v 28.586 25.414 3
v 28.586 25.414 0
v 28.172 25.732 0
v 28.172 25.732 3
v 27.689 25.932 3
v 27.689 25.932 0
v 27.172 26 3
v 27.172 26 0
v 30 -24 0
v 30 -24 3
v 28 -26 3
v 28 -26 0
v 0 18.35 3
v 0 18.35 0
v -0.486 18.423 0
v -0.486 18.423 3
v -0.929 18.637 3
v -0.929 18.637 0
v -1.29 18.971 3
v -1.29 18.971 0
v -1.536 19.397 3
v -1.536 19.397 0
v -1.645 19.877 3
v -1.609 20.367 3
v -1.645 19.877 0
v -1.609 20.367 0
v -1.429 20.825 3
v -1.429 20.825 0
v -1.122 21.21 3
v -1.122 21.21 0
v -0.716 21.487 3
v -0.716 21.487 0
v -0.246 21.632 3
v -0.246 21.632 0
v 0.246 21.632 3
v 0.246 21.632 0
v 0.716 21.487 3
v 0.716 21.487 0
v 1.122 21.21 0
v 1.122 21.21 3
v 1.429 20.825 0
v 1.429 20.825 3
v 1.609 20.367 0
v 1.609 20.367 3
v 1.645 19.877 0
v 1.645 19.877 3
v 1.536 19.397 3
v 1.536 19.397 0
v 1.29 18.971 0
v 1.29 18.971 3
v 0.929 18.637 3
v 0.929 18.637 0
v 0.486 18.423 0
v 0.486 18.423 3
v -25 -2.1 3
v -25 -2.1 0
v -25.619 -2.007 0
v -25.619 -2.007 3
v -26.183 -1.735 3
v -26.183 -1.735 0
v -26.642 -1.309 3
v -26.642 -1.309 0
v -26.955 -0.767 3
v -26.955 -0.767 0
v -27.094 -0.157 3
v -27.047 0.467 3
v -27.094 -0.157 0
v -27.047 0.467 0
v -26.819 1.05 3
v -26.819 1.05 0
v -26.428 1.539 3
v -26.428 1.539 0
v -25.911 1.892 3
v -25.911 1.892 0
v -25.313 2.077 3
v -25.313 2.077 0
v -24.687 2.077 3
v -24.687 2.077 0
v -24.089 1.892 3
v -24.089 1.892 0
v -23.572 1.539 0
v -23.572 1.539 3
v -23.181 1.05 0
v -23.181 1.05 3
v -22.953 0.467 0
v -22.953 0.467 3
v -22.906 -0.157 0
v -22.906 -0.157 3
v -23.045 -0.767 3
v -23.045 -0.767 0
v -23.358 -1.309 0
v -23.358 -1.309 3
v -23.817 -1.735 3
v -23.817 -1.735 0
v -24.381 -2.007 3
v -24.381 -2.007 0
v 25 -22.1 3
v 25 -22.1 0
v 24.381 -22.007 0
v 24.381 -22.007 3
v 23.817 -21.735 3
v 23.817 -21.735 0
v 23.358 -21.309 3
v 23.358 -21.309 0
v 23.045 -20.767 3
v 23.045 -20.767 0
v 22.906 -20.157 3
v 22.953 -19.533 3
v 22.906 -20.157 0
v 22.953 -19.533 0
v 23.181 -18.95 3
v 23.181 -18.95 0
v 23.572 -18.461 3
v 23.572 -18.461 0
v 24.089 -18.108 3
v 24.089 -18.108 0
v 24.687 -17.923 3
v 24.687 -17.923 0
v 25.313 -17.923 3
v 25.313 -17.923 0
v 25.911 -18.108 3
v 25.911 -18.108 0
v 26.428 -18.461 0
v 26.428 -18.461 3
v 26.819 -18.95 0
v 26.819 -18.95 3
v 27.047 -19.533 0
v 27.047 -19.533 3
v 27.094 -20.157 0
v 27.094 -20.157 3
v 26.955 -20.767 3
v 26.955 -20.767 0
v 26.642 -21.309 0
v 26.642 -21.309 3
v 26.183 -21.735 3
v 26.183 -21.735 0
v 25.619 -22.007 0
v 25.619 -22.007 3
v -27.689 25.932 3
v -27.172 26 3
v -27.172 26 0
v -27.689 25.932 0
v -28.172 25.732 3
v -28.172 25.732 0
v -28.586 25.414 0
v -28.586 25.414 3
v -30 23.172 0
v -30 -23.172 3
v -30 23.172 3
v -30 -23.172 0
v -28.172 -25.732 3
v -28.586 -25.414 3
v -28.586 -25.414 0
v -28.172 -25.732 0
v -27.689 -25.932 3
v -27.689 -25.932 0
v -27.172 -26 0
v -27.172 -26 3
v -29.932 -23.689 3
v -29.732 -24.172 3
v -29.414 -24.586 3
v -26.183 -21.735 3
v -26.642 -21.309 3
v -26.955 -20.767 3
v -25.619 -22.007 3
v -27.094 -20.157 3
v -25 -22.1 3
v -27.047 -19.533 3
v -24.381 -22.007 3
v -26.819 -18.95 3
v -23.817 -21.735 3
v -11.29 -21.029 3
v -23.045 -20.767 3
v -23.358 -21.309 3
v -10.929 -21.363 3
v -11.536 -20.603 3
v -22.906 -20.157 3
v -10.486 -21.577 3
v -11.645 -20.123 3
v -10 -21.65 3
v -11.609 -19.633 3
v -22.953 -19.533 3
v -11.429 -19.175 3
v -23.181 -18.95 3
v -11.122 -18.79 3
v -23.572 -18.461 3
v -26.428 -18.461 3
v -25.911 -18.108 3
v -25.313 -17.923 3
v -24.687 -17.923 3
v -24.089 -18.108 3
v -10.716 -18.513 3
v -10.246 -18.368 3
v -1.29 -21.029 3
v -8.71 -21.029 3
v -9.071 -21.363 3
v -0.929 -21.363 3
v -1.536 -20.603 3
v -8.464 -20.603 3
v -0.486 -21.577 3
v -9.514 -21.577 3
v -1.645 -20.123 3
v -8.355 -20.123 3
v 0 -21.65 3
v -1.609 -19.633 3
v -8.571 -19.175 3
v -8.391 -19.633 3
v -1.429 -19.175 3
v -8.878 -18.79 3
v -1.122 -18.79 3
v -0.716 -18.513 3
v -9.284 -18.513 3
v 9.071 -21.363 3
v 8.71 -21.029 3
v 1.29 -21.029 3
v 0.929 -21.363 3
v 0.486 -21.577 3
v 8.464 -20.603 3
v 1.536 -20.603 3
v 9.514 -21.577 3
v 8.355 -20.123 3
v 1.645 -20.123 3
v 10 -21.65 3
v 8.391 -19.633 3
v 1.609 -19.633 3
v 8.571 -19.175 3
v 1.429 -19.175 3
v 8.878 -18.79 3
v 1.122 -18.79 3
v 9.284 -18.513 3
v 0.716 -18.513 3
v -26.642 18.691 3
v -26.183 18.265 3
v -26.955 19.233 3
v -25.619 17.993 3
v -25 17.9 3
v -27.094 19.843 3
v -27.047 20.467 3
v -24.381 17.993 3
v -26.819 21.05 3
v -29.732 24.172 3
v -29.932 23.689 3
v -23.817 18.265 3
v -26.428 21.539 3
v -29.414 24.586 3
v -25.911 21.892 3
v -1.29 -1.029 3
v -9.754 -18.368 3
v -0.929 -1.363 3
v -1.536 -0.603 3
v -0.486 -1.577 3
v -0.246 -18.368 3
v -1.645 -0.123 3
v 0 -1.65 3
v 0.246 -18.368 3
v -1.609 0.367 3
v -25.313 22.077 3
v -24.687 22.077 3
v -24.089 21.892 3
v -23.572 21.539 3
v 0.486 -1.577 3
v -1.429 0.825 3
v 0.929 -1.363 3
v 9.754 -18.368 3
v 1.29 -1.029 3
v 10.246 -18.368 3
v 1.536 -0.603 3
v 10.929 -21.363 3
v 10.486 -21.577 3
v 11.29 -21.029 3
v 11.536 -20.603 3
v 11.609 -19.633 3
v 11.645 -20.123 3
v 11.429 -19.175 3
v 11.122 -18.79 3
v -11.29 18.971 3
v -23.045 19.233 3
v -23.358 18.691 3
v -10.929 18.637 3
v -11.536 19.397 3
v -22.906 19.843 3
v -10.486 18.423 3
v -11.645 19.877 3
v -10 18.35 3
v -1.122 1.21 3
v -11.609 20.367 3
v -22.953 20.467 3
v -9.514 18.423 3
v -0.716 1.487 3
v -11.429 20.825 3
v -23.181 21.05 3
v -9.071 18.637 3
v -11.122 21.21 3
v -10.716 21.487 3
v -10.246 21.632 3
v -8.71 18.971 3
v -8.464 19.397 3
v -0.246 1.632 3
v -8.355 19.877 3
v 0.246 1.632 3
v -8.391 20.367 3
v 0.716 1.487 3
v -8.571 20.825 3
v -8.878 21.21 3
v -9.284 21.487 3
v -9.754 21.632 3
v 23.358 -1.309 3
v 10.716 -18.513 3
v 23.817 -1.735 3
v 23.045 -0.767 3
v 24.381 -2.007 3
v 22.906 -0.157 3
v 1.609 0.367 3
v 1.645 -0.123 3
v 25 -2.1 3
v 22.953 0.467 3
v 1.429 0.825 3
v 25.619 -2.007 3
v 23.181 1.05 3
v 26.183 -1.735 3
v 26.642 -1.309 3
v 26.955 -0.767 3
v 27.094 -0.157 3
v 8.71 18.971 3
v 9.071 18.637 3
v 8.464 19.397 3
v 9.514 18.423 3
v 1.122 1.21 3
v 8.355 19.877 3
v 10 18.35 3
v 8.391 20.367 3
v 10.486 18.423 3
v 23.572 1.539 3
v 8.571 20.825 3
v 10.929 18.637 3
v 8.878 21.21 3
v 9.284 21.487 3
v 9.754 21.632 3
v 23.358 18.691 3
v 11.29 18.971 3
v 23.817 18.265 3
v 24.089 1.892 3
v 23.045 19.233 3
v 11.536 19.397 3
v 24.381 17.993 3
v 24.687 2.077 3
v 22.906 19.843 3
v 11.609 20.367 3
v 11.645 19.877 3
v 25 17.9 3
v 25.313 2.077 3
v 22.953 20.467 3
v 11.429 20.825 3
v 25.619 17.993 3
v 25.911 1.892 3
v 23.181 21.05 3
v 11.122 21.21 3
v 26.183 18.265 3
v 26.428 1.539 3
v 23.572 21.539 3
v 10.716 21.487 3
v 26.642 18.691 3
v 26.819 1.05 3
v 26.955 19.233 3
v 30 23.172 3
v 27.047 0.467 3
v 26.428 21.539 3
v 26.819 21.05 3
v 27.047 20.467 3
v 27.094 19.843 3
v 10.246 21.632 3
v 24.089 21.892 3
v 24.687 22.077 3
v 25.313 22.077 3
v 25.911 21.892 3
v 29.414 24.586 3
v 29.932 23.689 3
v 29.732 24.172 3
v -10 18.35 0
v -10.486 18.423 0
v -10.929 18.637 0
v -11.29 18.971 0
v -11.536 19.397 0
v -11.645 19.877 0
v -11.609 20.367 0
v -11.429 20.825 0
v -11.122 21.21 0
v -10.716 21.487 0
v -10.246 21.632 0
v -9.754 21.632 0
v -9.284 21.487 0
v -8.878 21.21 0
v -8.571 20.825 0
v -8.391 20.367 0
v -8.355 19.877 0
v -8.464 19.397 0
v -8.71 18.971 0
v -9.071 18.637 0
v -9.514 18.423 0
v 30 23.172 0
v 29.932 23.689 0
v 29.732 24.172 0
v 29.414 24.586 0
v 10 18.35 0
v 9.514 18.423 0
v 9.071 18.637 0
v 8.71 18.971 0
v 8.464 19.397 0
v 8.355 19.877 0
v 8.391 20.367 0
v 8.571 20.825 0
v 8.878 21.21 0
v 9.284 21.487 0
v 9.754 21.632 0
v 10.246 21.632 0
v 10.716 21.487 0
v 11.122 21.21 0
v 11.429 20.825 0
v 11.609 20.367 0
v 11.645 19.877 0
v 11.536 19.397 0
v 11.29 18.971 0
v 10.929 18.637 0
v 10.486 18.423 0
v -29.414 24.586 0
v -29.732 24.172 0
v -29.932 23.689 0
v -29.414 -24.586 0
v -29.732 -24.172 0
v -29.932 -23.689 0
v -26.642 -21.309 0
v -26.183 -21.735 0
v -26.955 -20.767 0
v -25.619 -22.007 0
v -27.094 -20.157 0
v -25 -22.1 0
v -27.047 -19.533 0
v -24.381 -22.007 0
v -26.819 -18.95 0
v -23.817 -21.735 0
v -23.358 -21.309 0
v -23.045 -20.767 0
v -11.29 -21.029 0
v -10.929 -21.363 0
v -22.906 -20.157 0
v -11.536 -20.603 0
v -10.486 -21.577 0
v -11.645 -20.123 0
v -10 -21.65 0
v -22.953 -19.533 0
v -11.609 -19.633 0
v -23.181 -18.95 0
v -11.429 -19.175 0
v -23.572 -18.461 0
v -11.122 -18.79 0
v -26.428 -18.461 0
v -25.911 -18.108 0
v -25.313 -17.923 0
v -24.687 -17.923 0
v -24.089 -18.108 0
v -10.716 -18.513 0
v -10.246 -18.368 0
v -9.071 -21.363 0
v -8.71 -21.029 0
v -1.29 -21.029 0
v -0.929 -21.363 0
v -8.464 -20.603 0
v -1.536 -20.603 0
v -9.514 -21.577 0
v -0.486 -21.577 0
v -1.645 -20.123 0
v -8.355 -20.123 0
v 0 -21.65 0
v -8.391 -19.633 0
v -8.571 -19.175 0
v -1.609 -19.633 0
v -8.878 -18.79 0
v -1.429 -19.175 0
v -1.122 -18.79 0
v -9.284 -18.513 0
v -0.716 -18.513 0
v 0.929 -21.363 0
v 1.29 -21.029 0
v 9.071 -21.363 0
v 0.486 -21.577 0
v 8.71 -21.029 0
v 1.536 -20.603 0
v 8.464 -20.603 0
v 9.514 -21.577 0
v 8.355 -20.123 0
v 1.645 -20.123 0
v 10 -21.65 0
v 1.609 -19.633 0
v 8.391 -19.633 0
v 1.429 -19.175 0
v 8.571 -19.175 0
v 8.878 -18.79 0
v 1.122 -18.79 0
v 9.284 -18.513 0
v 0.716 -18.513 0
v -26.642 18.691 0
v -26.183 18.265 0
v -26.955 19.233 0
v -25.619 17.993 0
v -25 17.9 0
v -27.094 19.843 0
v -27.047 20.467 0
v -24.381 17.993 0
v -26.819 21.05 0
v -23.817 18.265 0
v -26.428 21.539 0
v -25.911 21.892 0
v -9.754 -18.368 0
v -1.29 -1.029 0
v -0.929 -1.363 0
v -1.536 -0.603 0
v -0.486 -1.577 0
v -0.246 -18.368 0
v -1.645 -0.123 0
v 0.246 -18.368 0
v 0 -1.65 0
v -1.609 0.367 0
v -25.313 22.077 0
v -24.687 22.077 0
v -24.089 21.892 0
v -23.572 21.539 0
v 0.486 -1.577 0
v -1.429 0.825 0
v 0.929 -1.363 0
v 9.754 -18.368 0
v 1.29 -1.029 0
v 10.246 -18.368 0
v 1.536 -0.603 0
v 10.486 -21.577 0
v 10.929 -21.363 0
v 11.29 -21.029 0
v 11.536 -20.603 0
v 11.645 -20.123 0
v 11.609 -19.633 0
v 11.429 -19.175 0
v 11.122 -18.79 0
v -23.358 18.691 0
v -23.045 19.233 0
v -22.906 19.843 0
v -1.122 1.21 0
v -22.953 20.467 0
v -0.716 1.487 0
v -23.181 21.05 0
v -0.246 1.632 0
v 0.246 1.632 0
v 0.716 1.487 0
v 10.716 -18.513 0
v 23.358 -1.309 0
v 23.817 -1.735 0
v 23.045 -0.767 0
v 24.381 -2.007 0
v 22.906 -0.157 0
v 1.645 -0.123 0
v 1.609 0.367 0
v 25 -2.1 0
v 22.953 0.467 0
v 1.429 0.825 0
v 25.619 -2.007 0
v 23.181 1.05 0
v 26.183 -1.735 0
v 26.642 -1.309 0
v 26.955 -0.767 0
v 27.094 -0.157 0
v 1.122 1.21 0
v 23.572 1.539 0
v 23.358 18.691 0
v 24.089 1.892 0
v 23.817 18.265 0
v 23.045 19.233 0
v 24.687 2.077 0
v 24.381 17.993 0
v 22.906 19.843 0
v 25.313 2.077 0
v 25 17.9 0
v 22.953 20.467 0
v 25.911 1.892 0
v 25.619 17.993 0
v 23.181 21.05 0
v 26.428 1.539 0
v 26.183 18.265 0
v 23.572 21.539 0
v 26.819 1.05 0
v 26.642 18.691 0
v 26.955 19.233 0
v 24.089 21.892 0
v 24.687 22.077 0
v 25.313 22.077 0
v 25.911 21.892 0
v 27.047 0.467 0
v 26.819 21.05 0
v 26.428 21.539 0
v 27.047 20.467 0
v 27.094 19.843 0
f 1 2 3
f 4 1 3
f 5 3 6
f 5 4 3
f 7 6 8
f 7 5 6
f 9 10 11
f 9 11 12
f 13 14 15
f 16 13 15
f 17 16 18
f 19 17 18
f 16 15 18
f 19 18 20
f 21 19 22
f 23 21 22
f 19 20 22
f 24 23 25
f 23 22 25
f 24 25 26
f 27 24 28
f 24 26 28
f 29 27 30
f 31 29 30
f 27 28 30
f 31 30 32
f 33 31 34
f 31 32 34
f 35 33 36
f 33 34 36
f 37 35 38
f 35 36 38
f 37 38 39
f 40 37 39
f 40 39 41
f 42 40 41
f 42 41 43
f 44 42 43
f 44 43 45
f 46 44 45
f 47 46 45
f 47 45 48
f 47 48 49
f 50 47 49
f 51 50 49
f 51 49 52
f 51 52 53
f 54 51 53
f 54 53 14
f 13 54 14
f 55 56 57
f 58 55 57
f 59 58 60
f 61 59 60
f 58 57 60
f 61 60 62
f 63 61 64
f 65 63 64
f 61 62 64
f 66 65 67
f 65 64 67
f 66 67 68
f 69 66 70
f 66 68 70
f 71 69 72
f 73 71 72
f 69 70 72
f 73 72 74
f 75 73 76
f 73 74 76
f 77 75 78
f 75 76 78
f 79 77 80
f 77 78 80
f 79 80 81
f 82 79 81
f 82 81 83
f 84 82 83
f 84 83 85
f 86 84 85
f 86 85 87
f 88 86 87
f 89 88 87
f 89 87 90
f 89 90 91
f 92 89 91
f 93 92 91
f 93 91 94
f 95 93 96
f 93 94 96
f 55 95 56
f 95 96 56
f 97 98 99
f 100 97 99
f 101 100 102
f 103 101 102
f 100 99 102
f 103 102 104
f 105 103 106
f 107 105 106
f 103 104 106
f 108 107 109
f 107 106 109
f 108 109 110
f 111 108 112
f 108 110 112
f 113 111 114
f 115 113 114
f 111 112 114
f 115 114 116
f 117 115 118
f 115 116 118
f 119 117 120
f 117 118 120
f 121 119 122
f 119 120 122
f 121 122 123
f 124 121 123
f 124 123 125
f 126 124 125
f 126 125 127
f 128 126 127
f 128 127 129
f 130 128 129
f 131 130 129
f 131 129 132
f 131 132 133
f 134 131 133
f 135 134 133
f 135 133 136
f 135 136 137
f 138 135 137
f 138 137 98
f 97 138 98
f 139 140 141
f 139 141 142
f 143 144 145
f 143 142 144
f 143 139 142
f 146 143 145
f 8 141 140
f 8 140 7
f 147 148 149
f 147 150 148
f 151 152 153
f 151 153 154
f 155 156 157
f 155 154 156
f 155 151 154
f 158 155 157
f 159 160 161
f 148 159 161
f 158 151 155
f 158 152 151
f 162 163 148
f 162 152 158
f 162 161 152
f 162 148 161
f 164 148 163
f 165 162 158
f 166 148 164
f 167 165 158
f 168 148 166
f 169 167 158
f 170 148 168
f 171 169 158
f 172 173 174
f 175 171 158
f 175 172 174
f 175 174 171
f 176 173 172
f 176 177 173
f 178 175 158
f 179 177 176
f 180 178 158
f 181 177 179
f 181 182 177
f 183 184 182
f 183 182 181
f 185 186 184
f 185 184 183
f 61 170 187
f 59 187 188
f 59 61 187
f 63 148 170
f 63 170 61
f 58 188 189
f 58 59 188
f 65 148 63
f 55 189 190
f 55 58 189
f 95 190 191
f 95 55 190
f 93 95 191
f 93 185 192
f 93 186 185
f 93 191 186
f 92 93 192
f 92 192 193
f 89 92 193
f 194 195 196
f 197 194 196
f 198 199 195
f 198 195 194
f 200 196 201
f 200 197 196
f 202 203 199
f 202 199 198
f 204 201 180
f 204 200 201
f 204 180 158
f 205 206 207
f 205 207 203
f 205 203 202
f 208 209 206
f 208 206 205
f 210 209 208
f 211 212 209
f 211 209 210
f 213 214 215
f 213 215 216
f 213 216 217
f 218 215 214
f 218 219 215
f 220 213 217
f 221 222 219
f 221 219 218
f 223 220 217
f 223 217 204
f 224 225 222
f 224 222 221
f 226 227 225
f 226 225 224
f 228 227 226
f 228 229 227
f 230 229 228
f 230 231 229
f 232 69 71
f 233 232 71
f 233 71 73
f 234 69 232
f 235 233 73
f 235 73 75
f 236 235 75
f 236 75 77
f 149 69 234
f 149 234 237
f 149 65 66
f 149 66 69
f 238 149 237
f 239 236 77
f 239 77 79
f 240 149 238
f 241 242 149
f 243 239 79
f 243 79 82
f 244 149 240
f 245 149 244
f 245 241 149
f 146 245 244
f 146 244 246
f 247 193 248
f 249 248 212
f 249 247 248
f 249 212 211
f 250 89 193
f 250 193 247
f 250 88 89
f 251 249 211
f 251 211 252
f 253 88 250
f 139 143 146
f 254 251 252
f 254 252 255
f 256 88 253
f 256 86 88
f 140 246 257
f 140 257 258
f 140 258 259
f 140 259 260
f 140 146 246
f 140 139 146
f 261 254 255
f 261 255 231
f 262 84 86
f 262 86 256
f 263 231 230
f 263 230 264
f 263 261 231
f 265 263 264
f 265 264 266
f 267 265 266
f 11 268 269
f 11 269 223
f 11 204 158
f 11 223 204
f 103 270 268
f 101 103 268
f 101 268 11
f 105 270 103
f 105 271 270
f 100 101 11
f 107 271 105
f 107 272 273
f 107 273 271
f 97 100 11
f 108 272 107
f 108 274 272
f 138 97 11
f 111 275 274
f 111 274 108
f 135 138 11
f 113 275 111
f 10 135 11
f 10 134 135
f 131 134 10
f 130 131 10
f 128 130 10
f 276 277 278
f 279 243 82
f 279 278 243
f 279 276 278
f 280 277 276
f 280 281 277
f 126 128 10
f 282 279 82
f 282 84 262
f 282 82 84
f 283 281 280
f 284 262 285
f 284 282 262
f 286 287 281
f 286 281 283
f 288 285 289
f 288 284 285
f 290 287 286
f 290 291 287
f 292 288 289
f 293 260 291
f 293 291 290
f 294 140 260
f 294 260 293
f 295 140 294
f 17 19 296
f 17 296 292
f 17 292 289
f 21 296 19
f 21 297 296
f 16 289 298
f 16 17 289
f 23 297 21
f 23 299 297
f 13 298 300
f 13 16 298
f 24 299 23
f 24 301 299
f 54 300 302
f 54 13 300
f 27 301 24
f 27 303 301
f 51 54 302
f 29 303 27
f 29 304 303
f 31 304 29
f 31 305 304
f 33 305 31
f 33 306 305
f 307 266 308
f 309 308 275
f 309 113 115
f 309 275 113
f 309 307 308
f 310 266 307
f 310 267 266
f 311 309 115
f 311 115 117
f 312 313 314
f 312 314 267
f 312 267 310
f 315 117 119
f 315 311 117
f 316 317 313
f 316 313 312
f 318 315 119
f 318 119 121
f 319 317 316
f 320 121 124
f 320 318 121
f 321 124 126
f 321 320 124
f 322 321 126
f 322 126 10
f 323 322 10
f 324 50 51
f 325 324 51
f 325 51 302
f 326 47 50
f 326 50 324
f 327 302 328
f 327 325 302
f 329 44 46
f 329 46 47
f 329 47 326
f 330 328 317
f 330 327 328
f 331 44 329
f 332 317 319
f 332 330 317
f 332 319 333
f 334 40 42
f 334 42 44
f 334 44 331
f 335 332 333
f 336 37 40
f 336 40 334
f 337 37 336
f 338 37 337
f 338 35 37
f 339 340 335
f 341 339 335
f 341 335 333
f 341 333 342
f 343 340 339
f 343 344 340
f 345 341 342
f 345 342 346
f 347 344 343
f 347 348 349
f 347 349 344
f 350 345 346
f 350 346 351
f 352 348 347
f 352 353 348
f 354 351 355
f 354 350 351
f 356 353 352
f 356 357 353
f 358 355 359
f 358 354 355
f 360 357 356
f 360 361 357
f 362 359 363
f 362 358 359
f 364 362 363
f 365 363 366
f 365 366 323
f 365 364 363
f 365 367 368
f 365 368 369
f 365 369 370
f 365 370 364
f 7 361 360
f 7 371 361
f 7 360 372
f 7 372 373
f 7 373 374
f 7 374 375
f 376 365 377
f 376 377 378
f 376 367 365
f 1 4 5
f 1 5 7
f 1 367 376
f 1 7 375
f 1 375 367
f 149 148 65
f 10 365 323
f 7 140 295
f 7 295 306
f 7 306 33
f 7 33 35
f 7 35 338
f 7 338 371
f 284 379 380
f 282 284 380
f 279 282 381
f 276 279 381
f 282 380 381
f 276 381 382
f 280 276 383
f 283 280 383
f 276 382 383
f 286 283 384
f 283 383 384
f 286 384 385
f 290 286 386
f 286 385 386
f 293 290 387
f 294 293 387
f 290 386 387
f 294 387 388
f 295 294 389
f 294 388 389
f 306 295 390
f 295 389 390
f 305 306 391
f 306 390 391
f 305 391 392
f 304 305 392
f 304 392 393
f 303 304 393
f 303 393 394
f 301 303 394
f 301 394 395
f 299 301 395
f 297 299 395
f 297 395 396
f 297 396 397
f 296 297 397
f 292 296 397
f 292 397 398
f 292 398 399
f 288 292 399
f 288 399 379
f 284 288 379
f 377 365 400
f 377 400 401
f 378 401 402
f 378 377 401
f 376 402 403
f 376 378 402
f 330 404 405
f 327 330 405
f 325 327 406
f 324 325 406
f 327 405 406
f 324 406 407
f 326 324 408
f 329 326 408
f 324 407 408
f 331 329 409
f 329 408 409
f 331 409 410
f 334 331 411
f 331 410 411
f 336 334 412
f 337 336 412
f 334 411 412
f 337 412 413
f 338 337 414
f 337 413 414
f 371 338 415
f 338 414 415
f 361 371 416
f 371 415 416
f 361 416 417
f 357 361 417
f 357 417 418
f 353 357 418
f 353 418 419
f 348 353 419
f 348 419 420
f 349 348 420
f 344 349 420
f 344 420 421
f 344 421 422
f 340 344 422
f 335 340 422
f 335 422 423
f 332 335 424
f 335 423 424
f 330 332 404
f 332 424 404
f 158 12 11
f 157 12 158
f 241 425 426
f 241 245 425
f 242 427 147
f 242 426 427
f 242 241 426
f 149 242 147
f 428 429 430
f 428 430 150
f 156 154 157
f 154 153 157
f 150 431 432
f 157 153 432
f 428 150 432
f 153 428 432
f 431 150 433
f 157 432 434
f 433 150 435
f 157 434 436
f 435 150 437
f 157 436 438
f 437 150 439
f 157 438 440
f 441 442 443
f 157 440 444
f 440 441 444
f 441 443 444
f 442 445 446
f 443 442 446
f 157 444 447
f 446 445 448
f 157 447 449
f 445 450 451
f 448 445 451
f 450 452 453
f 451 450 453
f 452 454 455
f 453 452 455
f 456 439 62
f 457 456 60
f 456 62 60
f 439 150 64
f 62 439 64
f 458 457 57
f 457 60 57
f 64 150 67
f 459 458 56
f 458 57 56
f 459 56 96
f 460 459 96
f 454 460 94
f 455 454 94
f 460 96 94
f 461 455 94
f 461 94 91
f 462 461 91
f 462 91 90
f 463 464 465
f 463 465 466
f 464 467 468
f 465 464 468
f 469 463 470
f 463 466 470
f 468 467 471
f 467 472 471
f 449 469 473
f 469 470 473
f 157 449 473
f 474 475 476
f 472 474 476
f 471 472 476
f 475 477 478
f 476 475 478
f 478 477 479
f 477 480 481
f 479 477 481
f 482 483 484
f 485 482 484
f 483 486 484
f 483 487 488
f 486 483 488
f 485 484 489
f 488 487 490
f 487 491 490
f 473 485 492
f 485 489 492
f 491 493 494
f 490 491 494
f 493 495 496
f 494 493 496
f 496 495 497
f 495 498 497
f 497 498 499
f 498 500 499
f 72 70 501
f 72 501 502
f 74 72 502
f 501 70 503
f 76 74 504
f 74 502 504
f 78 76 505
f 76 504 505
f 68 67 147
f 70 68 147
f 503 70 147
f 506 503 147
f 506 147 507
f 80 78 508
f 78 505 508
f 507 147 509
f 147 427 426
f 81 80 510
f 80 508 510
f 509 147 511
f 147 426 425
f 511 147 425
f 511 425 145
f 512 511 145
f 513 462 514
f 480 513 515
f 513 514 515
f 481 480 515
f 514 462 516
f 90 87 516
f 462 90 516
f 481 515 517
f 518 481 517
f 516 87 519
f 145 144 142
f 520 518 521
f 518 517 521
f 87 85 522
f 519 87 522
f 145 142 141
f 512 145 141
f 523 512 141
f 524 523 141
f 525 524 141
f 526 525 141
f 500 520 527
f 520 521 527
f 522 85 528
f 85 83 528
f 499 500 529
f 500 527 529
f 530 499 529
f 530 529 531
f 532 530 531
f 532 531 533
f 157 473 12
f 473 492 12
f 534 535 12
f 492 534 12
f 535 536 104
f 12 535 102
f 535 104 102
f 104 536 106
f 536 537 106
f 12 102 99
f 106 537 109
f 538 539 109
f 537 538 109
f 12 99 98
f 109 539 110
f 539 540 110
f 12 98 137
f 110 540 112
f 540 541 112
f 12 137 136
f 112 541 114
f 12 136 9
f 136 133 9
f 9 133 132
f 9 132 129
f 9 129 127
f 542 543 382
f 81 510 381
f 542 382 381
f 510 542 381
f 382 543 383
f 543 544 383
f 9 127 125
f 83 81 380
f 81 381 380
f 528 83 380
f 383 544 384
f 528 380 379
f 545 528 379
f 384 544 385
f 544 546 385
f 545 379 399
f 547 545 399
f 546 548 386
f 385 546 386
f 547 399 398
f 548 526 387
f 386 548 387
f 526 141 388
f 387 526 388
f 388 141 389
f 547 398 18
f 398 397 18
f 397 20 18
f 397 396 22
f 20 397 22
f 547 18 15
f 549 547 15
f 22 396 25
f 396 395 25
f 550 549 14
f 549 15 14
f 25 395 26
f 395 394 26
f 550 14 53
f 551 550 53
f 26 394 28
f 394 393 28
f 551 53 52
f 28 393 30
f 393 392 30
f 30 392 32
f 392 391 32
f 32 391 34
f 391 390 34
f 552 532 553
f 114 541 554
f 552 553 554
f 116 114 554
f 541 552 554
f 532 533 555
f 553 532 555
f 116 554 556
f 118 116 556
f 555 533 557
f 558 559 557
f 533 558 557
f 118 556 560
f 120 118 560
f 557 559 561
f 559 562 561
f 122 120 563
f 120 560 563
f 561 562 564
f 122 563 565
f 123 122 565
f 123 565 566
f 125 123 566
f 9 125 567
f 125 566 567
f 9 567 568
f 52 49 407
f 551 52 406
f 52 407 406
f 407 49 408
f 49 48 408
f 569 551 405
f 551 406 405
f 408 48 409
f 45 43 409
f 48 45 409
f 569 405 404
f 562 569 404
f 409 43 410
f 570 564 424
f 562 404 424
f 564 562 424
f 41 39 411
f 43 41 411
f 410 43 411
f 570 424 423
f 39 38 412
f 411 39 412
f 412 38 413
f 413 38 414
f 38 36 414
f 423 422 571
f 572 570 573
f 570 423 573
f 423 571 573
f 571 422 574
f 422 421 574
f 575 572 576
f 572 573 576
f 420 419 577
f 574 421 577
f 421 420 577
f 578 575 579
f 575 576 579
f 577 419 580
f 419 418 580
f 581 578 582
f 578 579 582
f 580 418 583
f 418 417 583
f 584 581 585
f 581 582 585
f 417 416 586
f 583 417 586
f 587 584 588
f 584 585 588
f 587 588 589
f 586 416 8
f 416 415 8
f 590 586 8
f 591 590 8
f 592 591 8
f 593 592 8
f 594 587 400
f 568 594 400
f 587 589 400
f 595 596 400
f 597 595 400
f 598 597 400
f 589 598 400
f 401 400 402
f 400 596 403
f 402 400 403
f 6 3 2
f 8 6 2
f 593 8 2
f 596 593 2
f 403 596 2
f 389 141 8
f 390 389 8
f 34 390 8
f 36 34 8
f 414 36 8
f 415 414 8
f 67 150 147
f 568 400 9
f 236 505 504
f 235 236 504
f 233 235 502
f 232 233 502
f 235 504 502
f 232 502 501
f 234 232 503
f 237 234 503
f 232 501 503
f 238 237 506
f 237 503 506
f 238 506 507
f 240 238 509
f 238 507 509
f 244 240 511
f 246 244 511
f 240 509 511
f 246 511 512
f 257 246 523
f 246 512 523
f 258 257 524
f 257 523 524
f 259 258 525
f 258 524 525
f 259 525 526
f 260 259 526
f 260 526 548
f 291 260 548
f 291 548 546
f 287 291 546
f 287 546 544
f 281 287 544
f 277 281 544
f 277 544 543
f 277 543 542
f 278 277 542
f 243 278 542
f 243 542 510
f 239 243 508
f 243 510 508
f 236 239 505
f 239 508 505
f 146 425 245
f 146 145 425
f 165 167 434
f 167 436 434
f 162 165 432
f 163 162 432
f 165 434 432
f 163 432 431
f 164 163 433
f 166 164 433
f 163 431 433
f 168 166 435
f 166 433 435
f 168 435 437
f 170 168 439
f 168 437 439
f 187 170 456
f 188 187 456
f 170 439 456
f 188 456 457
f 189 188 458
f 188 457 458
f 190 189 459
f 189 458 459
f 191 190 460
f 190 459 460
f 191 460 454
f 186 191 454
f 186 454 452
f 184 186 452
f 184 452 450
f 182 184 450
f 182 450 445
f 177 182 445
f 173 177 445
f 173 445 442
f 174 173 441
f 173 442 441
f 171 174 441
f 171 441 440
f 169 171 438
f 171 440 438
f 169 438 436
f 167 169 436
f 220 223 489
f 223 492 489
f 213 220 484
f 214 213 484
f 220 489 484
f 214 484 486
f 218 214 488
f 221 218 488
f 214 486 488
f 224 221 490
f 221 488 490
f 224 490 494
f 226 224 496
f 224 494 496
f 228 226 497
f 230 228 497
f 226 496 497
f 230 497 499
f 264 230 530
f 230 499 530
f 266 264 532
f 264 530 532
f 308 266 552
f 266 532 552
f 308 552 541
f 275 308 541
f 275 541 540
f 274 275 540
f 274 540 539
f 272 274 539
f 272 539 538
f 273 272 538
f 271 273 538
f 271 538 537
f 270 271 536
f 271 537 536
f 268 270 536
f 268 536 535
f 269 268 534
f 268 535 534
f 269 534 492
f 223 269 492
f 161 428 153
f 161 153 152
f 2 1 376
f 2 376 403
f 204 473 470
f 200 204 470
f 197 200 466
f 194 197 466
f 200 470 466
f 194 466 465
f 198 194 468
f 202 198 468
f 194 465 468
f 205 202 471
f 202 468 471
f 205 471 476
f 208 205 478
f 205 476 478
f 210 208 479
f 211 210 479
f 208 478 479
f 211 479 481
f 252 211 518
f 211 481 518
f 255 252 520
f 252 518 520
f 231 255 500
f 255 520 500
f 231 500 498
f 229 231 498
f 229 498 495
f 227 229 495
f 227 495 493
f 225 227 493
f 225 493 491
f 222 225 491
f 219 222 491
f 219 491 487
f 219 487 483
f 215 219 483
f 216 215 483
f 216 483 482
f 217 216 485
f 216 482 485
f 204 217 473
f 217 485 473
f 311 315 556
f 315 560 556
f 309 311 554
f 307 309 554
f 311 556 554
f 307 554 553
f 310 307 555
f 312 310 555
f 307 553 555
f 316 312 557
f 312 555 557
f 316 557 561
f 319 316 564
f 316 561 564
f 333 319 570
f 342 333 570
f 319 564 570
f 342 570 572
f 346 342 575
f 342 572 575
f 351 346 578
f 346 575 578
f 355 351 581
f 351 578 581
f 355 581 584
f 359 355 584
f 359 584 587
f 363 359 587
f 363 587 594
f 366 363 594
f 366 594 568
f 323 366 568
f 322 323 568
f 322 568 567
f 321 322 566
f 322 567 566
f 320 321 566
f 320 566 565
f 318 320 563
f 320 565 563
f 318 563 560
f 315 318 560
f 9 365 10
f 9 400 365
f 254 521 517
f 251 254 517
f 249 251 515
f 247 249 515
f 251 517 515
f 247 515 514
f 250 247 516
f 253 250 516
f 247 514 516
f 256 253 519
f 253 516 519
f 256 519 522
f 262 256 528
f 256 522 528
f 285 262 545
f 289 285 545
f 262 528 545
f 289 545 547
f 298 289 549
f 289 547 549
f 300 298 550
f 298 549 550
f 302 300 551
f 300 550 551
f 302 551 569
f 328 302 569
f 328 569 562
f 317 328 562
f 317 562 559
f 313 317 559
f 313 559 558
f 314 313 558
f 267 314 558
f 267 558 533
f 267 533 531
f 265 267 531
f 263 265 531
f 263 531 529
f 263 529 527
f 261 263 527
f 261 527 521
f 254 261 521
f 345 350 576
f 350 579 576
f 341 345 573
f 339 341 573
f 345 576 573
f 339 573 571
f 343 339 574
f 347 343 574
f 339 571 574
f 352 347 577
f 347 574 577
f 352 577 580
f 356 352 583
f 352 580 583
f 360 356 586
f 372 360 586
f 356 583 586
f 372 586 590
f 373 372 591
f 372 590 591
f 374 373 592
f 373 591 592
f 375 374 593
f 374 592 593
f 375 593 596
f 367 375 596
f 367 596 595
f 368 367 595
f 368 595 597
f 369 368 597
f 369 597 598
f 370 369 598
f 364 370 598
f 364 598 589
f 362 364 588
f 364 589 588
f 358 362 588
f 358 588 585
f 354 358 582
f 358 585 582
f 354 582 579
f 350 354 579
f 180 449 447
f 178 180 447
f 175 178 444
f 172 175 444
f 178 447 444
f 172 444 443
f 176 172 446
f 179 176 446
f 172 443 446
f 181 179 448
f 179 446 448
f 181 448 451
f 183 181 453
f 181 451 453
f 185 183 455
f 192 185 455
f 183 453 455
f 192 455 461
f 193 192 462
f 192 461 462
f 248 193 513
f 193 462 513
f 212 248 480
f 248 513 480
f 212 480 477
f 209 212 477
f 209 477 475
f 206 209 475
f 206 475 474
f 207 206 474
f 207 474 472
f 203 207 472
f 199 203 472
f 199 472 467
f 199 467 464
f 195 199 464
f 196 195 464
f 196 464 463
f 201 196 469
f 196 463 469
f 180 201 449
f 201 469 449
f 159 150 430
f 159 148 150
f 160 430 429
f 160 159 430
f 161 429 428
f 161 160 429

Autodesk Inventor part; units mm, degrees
ref_plane "YZ Plane" through (0, 0, 0) normal (1, 0, 0) x (0, 1, 0)
ref_plane "XZ Plane" through (0, 0, 0) normal (0, 1, 0) x (-1, 0, 0)
ref_plane "XY Plane" through (0, 0, 0) normal (0, 0, 1) x (1, 0, 0)
sketch "スケッチ1" plane through (0, 0, 0) normal (0, 0, 1) x (1, 0, 0)
  line L0 (30, -26) -> (-30, -26)
  line L1 (-30, -26) -> (-30, 26)
  line L2 (-30, 26) -> (30, 26)
  line L3 (30, 26) -> (30, -26)
  line L4 (30, -26) -> (-30, 26) construction
  line L5 (-30, -26) -> (30, 26) construction
  point P0 (0, 0)
  dimension "d0" = 60
  dimension "d1" = 52
extrude "押し出し1" add sketch "スケッチ1" along normal blind 3
sketch "スケッチ2" plane through (0, 0, 3) normal (0, 0, 1) x (1, 0, 0)
  line L0 (-10, -20) -> (10, -20)
  line L1 (10, -20) -> (10, 20)
  line L2 (10, 20) -> (-10, 20)
  line L3 (-10, 20) -> (-10, -20)
  line L4 (-10, -20) -> (10, 20) construction
  line L5 (10, -20) -> (-10, 20) construction
  line L6 (-30, -26) -> (30, -26) projected
  point P0 (0, 0)
  point P1 (0, 20)
  point P2 (0, -20)
  dimension "d4" = 20
  dimension "d5" = 40
  dimension "d6" = 6
hole "穴1" at (-10, 20, 3) at (-10, -20, 3) at (10, -20, 3) at (10, 20, 3) at (0, -20, 3) at (0, 0, 3) at (0, 20, 3) direction (0, 0, -1) diameter 3.3 depth 8.8
sketch "スケッチ4" plane through (0, 0, 3) normal (0, 0, 1) x (1, 0, 0)
  line L0 (-25, -20) -> (25, -20)
  line L1 (25, -20) -> (25, 20)
  line L2 (25, 20) -> (-25, 20)
  line L3 (-25, 20) -> (-25, -20)
  line L4 (-25, -20) -> (25, 20) construction
  line L5 (25, -20) -> (-25, 20) construction
  point P0 (0, 0)
  point P1 (0, 20)
  point P2 (0, -20)
  point P3 (0, 0)
  point P4 (-25, 0)
  point P5 (25, 0)
  dimension "d14" = 50
  dimension "d15" = 40
hole "穴2" at (-25, 20, 3) at (-25, -20, 3) at (25, -20, 3) at (25, 20, 3) at (-25, 0, 3) at (25, 0, 3) direction (0, 0, -1) diameter 4.2 depth 8.8
chamfer "面取り1" distance 2 angle 45 4 edges at (-30, 26, 1.5) (-30, -26, 1.5) (30, -26, 1.5) (30, 26, 1.5)
fillet "フィレット2" radius 2 6 edges at (30, 24, 1.5) (28, 26, 1.5) (-28, 26, 1.5) (-30, 24, 1.5) (-30, -24, 1.5) (-28, -26, 1.5)
sketch "スケッチ5" plane through (0, 0, 3) normal (0, 0, 1) x (1, 0, 0)
  circle A0 centre (-25, 0) radius 2.1 projected
  circle A1 centre (25, -20) radius 2.1 projected
  circle A2 centre (-25, 20) radius 2.1 projected
  circle A3 centre (-25, -20) radius 2.1 projected
  circle A4 centre (25, 20) radius 2.1 projected
  circle A5 centre (25, 0) radius 2.1 projected
  circle A6 centre (0, 0) radius 1.65 projected
  circle A7 centre (10, 20) radius 1.65 projected
  circle A8 centre (-10, -20) radius 1.65 projected
  circle A9 centre (-10, 20) radius 1.65 projected
  circle A10 centre (10, -20) radius 1.65 projected
  circle A11 centre (0, -20) radius 1.65 projected
  circle A12 centre (0, 20) radius 1.65 projected
  arc A13 (-28.5858, -25.4142) -> (-27.1716, -26) centre (-27.1716, -24) ccw projected
  line L0 (-27.1716, -26) -> (28, -26) projected
  line L1 (30, -24) -> (28, -26) projected
  line L2 (30, -24) -> (30, 23.1716) projected
  arc A14 (30, 23.1716) -> (29.4142, 24.5858) centre (28, 23.1716) ccw projected
  line L3 (28.5858, 25.4142) -> (29.4142, 24.5858) projected
  arc A15 (28.5858, 25.4142) -> (27.1716, 26) centre (27.1716, 24) ccw projected
  line L4 (27.1716, 26) -> (-27.1716, 26) projected
  arc A16 (-27.1716, 26) -> (-28.5858, 25.4142) centre (-27.1716, 24) ccw projected
  line L5 (-29.4142, 24.5858) -> (-28.5858, 25.4142) projected
  arc A17 (-29.4142, 24.5858) -> (-30, 23.1716) centre (-28, 23.1716) ccw projected
  line L6 (-30, 23.1716) -> (-30, -23.1716) projected
  arc A18 (-30, -23.1716) -> (-29.4142, -24.5858) centre (-28, -23.1716) ccw projected
  line L7 (-28.5858, -25.4142) -> (-29.4142, -24.5858) projected
  point P0 (0, 0)
properties part number "Diode_laser_Mount"
